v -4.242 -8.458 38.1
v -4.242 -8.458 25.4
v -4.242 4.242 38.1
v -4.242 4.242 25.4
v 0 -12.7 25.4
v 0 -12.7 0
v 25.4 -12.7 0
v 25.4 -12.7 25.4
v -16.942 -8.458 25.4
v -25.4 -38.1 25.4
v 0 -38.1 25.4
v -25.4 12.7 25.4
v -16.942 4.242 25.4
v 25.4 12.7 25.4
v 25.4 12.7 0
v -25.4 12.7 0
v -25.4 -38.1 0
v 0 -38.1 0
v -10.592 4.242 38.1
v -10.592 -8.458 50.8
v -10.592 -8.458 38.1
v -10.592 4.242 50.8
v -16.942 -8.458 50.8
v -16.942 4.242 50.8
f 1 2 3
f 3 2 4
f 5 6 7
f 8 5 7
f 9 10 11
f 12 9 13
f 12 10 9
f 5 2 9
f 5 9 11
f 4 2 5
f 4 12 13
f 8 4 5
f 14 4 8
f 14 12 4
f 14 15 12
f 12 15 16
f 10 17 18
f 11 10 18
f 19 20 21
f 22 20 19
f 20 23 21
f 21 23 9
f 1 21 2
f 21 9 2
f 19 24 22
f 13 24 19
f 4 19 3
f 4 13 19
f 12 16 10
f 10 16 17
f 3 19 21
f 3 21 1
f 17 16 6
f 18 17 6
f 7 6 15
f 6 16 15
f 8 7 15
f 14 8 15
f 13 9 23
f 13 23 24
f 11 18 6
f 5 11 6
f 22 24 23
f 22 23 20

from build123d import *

# Parameters (mm, degrees)
F1_DEPTH = 25.4
F2_W     = 12.7
F2_H     = 12.7
F3_DEPTH = 25.4
F4_W     = 6.35
F4_H     = 12.7
F5_DEPTH = 12.7


with BuildPart() as f1:
    # F0 (on Top) → F1 (new body)
    with BuildSketch(Plane.XY):
        Polygon((25.4, -12.7), (25.4, 12.7), (0, 12.7), (-25.4, 12.7), (-25.4, -12.7), (-25.4, -38.1), (0, -38.1), (0, -12.7), align=None)
    extrude(amount=F1_DEPTH)

    # F2 (on face) → F3 (join)
    with BuildSketch(Plane.XY.offset(25.4)):
        with Locations((-10.5918, -2.1082)):
            Rectangle(F2_W, F2_H)
    extrude(amount=F3_DEPTH)

    # F4 (on face) → F5 (cut)
    with BuildSketch(Plane.XY.offset(50.8)):
        with Locations((-7.4168, -2.1082)):
            Rectangle(F4_W, F4_H)
    extrude(amount=-F5_DEPTH, mode=Mode.SUBTRACT)


solid = f1.part
